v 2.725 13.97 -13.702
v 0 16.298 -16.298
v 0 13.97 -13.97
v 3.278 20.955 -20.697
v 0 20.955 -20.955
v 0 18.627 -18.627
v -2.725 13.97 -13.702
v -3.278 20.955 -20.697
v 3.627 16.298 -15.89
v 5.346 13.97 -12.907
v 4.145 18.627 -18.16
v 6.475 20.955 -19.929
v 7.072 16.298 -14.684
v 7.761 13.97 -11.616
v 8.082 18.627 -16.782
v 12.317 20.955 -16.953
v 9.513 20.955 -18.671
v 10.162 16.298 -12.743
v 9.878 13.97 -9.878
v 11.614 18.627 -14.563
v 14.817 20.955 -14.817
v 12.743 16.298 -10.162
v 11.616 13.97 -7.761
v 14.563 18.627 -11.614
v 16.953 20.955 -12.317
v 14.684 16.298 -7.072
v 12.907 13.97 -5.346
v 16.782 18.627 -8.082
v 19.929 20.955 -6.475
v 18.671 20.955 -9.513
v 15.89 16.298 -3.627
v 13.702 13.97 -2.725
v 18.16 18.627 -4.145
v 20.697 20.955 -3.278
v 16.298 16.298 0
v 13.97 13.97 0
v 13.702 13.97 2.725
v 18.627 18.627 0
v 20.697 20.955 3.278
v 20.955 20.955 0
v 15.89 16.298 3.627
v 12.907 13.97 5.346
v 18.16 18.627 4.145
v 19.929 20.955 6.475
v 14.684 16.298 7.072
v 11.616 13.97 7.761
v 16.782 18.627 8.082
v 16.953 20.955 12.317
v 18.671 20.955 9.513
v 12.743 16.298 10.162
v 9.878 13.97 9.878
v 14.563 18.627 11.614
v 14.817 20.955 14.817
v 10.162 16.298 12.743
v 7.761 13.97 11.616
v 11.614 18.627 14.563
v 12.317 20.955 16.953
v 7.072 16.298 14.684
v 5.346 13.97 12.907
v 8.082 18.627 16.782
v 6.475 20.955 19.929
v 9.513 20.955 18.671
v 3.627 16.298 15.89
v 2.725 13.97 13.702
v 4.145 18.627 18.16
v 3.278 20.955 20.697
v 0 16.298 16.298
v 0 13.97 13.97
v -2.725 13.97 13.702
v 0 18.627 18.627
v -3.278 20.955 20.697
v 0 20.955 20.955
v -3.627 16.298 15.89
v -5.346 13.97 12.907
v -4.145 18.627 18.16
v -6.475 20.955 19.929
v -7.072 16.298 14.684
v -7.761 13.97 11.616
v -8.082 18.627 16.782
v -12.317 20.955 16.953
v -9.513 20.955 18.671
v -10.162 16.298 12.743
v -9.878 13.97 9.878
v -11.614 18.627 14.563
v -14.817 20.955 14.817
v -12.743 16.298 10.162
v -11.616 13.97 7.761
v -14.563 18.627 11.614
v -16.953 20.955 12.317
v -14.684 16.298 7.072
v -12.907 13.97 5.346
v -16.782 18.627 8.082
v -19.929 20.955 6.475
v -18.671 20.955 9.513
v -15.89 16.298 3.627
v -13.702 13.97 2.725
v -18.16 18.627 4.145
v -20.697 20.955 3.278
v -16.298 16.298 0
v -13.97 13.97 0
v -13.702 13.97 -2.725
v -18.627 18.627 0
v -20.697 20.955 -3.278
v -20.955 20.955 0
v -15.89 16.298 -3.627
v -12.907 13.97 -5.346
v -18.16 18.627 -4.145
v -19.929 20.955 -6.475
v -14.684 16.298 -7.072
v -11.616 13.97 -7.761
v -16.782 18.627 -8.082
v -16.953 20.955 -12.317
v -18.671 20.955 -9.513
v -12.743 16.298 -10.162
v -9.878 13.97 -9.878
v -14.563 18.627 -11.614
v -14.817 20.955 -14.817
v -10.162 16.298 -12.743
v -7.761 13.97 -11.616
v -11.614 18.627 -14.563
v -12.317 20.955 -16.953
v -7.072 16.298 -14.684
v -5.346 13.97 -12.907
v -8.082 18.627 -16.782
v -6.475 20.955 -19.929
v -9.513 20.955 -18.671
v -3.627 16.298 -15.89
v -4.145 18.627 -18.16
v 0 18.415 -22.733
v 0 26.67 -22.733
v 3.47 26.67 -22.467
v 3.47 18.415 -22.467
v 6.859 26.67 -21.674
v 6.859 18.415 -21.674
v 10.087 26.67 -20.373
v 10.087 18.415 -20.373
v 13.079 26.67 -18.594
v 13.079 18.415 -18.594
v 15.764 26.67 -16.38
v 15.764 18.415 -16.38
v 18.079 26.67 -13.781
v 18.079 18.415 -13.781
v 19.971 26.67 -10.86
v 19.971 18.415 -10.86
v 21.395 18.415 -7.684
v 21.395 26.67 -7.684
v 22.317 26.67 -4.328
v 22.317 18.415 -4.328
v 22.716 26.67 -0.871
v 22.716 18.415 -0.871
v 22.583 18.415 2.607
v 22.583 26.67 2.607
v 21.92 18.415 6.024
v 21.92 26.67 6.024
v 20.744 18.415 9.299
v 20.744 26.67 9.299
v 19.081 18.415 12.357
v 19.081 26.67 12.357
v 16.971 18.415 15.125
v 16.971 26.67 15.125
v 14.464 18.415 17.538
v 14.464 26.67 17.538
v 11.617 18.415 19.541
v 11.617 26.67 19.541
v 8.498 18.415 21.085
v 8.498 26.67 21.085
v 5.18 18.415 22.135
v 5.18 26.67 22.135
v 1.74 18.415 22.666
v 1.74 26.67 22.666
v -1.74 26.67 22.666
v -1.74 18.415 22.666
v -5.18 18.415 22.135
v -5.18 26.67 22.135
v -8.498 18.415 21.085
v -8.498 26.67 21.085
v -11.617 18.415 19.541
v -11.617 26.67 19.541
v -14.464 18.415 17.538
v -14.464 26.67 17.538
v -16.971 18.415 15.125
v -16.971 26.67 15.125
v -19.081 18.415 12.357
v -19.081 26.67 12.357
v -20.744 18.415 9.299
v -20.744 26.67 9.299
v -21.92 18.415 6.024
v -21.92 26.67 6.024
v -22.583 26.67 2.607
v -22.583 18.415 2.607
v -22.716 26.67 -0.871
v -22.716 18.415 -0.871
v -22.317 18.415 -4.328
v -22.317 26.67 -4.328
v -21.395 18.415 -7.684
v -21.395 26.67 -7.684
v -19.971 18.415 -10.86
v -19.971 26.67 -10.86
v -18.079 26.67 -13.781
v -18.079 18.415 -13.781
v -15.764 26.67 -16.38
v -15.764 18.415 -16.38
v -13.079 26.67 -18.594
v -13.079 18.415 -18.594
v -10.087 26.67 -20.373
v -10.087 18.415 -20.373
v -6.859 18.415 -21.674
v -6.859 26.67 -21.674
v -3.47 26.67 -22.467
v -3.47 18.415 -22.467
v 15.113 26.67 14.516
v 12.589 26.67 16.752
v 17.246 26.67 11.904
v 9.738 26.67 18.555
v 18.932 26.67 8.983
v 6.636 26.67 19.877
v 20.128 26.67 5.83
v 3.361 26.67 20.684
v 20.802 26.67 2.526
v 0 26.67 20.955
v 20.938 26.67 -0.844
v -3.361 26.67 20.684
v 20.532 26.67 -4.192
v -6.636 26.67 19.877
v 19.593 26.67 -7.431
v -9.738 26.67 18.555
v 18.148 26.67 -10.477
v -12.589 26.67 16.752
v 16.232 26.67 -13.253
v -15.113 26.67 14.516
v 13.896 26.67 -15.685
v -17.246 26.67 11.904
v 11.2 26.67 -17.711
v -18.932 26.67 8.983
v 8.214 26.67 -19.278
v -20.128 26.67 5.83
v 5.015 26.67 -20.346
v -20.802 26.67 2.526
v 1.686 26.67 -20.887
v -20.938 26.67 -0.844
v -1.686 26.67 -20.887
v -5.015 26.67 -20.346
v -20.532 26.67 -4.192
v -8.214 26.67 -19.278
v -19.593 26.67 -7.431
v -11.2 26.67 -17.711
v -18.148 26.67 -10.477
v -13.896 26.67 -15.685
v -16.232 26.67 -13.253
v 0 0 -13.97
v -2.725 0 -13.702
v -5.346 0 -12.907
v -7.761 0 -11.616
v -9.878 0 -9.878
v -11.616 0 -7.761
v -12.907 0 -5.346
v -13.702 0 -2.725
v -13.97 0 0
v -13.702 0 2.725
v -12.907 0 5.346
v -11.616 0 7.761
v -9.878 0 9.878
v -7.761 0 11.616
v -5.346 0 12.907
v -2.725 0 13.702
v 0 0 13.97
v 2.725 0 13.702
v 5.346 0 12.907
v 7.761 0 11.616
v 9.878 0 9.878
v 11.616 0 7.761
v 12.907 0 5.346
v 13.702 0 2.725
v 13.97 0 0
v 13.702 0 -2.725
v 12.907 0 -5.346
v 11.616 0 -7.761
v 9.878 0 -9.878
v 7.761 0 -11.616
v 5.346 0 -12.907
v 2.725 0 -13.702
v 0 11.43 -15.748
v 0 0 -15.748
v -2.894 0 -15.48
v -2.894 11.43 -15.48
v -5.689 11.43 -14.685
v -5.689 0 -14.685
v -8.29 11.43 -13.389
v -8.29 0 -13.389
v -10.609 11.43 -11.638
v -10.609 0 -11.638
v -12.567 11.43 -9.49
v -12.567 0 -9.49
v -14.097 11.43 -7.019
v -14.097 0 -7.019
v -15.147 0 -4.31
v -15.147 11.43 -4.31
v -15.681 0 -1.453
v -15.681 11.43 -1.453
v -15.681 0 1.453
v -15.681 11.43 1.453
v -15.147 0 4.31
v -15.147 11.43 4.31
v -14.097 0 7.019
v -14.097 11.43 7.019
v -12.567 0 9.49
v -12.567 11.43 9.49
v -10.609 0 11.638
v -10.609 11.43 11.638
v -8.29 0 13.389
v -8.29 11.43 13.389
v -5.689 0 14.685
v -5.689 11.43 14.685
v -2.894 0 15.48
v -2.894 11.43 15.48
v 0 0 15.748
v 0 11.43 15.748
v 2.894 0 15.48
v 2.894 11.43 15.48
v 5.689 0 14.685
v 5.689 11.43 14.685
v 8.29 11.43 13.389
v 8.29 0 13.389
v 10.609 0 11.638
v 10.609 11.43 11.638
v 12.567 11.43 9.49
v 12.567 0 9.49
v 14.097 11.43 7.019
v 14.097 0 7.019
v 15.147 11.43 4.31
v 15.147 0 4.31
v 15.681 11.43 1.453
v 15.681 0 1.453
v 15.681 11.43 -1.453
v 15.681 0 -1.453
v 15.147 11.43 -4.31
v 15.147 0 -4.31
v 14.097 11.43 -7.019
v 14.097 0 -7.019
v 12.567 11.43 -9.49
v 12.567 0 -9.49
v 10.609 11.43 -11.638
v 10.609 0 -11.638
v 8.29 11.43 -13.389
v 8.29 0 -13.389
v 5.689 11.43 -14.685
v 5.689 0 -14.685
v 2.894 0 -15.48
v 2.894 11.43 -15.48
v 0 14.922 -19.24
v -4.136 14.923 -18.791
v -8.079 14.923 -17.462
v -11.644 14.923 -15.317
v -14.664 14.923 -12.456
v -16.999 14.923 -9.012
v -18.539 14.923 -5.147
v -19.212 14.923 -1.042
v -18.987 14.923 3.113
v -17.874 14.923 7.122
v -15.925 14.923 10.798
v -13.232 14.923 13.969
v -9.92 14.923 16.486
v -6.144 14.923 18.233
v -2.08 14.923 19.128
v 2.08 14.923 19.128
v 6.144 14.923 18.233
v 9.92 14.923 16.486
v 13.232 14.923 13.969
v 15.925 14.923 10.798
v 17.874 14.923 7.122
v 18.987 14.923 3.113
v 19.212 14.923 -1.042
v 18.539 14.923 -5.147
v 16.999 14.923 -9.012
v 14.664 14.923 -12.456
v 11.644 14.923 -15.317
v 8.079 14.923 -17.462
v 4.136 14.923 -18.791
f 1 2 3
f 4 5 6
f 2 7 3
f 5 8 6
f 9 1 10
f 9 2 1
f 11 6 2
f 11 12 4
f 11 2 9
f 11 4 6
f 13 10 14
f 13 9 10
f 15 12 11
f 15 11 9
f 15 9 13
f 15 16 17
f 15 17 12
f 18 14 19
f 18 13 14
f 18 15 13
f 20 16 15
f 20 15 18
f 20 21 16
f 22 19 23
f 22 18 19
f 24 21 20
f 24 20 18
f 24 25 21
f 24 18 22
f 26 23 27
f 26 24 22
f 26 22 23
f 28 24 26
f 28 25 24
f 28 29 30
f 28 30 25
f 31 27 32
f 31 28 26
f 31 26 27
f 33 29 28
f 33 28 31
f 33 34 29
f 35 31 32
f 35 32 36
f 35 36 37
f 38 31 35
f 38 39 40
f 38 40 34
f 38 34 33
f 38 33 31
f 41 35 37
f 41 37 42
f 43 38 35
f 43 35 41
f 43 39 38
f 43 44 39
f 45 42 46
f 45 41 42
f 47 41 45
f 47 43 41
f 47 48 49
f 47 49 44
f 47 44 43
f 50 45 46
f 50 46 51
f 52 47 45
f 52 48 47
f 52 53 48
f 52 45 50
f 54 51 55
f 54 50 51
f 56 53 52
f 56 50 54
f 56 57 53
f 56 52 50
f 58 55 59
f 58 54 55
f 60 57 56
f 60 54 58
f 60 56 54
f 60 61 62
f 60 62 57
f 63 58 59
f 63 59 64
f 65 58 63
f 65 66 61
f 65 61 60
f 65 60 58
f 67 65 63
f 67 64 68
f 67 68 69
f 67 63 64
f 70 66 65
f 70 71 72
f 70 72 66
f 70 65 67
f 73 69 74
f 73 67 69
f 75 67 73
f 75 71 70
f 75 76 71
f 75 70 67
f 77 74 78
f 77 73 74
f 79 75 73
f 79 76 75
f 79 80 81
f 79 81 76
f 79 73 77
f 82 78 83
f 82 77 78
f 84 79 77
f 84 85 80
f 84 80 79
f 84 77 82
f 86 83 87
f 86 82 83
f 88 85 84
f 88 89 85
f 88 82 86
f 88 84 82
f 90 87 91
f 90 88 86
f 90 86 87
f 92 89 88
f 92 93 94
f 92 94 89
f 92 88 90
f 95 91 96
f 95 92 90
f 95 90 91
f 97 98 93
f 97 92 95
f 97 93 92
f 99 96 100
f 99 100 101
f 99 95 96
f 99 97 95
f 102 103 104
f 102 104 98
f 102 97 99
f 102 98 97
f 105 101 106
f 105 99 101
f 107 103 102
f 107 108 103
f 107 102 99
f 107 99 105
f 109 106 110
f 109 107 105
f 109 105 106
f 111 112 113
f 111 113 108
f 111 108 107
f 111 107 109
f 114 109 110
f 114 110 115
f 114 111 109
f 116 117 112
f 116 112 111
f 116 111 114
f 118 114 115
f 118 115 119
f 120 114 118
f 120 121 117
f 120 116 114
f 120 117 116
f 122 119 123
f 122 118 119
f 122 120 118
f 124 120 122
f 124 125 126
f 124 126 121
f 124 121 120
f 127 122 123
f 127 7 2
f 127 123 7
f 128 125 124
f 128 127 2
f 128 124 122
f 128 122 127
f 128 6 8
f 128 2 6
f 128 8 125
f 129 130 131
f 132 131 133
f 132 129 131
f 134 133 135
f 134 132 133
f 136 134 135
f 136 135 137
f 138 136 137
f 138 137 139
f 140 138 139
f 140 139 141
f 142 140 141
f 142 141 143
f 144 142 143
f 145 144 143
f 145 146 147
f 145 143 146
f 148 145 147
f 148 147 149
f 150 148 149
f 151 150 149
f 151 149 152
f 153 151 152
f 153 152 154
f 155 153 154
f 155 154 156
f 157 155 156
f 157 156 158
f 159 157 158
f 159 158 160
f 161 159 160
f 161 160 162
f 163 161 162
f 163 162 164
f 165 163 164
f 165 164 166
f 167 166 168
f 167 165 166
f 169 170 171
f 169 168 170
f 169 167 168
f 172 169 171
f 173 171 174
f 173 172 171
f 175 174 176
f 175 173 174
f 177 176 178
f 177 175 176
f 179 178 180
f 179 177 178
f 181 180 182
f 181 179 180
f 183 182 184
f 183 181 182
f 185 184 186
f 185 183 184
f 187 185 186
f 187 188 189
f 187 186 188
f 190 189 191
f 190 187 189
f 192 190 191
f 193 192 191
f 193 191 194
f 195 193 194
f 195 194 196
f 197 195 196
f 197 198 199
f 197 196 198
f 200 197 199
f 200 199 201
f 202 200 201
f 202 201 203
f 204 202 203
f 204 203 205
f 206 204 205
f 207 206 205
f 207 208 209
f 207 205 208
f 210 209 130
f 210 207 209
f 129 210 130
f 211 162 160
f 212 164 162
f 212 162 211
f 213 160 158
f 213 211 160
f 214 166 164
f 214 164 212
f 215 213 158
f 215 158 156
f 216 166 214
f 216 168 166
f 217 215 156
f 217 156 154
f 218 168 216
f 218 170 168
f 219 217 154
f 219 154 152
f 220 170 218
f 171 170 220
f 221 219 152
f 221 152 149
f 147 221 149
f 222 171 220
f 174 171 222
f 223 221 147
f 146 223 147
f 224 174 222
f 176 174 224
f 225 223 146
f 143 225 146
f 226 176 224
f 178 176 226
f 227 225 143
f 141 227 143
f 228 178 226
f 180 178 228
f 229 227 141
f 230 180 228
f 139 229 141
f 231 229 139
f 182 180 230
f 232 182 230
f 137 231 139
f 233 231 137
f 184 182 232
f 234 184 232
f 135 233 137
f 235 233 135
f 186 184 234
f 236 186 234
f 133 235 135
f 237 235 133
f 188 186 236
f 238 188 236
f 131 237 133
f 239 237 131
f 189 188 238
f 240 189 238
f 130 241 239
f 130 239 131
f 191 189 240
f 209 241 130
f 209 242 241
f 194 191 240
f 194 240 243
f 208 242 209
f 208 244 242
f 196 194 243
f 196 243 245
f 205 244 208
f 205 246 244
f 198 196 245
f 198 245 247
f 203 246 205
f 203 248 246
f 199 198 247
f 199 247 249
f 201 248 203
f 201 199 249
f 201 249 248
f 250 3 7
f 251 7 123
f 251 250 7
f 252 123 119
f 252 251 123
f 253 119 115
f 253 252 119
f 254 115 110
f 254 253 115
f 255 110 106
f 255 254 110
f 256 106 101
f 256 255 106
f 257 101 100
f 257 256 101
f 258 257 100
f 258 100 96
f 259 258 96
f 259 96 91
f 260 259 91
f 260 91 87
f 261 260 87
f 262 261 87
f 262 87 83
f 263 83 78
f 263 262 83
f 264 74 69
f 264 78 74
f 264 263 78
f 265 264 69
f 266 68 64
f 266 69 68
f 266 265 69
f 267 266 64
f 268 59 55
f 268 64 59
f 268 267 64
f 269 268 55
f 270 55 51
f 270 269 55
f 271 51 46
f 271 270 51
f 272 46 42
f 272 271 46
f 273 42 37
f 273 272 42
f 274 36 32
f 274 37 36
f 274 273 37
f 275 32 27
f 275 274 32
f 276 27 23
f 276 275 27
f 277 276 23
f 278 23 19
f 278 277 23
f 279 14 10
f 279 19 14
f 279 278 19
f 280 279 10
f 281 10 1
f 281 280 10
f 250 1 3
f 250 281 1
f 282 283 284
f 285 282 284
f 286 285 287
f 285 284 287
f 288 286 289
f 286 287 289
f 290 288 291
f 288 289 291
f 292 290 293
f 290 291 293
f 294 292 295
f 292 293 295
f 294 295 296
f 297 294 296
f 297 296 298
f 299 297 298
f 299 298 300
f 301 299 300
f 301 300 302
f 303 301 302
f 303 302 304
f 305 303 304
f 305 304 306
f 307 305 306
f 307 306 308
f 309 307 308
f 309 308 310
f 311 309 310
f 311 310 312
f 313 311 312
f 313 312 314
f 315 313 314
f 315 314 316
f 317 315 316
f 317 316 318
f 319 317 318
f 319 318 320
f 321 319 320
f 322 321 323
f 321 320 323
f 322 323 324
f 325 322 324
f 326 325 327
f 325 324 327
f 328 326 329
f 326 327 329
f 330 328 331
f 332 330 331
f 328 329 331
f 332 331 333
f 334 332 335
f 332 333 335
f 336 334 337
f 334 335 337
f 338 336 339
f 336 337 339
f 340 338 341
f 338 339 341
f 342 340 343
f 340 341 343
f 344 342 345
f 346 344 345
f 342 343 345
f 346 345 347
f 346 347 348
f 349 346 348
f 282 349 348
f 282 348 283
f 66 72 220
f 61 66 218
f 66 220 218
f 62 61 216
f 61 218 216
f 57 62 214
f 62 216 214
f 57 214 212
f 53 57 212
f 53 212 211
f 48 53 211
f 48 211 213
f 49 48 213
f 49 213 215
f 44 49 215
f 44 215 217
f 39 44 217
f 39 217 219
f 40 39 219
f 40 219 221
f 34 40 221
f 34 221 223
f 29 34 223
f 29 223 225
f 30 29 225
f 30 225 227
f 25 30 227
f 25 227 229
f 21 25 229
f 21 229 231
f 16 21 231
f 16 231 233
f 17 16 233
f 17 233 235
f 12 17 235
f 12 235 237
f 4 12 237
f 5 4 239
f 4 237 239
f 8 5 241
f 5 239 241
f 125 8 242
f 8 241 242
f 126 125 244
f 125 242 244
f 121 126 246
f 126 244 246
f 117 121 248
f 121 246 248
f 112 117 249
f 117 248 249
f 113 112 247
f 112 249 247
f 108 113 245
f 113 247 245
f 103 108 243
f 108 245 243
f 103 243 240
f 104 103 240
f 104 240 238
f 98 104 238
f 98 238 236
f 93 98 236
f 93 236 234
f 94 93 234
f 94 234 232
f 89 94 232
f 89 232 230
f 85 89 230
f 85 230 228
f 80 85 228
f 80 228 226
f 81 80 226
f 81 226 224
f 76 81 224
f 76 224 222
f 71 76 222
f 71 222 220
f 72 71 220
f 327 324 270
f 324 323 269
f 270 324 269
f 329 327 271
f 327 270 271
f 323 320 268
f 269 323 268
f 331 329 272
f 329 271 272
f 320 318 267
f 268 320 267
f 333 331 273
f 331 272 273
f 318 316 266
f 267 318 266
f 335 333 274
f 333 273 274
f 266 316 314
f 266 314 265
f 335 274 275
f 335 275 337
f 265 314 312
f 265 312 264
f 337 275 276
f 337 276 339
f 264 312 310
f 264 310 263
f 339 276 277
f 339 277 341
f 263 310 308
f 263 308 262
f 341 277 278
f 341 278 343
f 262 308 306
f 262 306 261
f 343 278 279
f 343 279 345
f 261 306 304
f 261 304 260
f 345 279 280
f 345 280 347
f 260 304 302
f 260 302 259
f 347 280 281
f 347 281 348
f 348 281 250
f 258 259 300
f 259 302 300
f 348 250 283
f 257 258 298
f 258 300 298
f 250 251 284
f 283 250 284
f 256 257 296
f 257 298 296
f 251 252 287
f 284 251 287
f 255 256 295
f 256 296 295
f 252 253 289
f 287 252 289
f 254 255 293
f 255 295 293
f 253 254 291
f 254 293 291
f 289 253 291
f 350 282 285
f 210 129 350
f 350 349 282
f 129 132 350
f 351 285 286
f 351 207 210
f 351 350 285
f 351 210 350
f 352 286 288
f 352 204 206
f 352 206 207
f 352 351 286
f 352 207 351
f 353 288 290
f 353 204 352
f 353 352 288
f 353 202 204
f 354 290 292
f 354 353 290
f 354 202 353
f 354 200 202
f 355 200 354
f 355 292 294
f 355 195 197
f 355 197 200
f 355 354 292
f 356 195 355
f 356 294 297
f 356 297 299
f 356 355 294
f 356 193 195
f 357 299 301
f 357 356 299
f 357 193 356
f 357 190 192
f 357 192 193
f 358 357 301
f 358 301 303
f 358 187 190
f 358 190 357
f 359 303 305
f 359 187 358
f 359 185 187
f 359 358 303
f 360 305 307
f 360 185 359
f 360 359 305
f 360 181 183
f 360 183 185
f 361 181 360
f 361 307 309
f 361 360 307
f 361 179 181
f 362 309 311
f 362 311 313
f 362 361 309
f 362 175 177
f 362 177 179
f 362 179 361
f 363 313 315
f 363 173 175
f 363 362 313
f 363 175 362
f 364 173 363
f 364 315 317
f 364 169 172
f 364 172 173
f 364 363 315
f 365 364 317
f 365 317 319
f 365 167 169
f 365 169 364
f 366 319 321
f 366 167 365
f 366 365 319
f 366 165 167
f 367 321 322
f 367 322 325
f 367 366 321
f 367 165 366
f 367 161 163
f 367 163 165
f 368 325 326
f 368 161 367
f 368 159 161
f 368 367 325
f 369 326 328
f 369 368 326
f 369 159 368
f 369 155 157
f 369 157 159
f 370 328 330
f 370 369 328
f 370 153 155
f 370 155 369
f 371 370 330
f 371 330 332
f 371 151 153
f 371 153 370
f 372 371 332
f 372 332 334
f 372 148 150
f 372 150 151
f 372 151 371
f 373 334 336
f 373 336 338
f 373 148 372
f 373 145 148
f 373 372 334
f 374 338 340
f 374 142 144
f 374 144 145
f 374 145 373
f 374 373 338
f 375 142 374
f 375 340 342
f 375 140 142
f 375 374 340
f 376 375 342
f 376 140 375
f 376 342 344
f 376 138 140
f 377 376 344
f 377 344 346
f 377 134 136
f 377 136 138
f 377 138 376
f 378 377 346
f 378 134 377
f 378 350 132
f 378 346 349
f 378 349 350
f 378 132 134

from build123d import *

# Parameters (mm, degrees)
SKETCH1_R           = 15.748
SKETCH1_R_2         = 13.97
BOSS_EXTRUDE1_DEPTH = 19.05
SKETCH2_R           = 22.733
SKETCH2_R_2         = 13.97
BOSS_EXTRUDE2_DEPTH = 7.62
SKETCH3_R           = 20.955
CUT_EXTRUDE1_DEPTH  = 5.08
CHAMFER1_SIZE       = 7.62
CHAMFER2_SIZE       = 7.62


with BuildPart() as part:
    # Sketch1 → Boss-Extrude1 (new body)
    with BuildSketch(Plane(origin=(0, 0, 0), x_dir=(1, 0, 0), z_dir=(0, 1, 0))):
        with Locations(Location((0, 0, 0), (0, 0, 90))):
            Circle(SKETCH1_R)
        with Locations(Location((0, 0, 0), (0, 0, 90))):
            Circle(SKETCH1_R_2, mode=Mode.SUBTRACT)
    extrude(amount=BOSS_EXTRUDE1_DEPTH)

    # Sketch2 → Boss-Extrude2 (add)
    with BuildSketch(Plane(origin=(0, 19.05, 0), x_dir=(1, 0, 0), z_dir=(0, 1, 0))):
        with Locations(Location((0, 0, 0), (0, 0, 90))):
            Circle(SKETCH2_R)
        with Locations(Location((0, 0, 0), (0, 0, 90))):
            Circle(SKETCH2_R_2, mode=Mode.SUBTRACT)
    extrude(amount=BOSS_EXTRUDE2_DEPTH)

    # Sketch3 → Cut-Extrude1 (cut)
    with BuildSketch(Plane(origin=(0, 26.67, 0), x_dir=(1, 0, 0), z_dir=(0, 1, 0))):
        with Locations(Location((0, 0, 0), (0, 0, 270))):
            Circle(SKETCH3_R)
    extrude(amount=-CUT_EXTRUDE1_DEPTH, mode=Mode.SUBTRACT)

    # Chamfer1
    # the kernel refuses this chamfer: 7.62 mm, written as the material it adds along each edge
    with BuildSketch(Plane(origin=(0, 19.05, 0), x_dir=(0, 0, -1), z_dir=(1, 0, 0))) as chamfer1_piece_1_section:
        Polygon((15.748, -CHAMFER1_SIZE), (15.748 + CHAMFER1_SIZE, 0), (15.748, 0), align=None)
    chamfer1_piece_1 = revolve(axis=Axis((0, 19.05, 0), (0, 1, 0)), mode=Mode.PRIVATE)
    chamfer1_piece_1 = chamfer1_piece_1 & Plane(origin=(0, 14.923095596, 0), x_dir=(0, 0, -1), z_dir=(0, -1, 0)) * Cylinder(22.733, 94, mode=Mode.PRIVATE)
    add(chamfer1_piece_1)

    # Chamfer2
    # the kernel refuses this chamfer: 7.62 mm, written as the material it takes off along each edge
    with BuildSketch(Plane(origin=(0, 21.59, 0), x_dir=(0, 0, -1), z_dir=(-1, 0, 0))) as chamfer2_piece_1_section:
        Polygon((13.97, CHAMFER2_SIZE), (13.97 + CHAMFER2_SIZE, 0), (13.97, 0), align=None)
    chamfer2_piece_1 = revolve(axis=Axis((0, 21.59, 0), (0, -1, 0)), mode=Mode.PRIVATE)
    chamfer2_piece_1 = chamfer2_piece_1 & Plane(origin=(0, 17.459443448, 0), x_dir=(0, 0, 1), z_dir=(0, 1, 0)) * Cylinder(20.955, 87, mode=Mode.PRIVATE)
    add(chamfer2_piece_1, mode=Mode.SUBTRACT)


solid = part.part
